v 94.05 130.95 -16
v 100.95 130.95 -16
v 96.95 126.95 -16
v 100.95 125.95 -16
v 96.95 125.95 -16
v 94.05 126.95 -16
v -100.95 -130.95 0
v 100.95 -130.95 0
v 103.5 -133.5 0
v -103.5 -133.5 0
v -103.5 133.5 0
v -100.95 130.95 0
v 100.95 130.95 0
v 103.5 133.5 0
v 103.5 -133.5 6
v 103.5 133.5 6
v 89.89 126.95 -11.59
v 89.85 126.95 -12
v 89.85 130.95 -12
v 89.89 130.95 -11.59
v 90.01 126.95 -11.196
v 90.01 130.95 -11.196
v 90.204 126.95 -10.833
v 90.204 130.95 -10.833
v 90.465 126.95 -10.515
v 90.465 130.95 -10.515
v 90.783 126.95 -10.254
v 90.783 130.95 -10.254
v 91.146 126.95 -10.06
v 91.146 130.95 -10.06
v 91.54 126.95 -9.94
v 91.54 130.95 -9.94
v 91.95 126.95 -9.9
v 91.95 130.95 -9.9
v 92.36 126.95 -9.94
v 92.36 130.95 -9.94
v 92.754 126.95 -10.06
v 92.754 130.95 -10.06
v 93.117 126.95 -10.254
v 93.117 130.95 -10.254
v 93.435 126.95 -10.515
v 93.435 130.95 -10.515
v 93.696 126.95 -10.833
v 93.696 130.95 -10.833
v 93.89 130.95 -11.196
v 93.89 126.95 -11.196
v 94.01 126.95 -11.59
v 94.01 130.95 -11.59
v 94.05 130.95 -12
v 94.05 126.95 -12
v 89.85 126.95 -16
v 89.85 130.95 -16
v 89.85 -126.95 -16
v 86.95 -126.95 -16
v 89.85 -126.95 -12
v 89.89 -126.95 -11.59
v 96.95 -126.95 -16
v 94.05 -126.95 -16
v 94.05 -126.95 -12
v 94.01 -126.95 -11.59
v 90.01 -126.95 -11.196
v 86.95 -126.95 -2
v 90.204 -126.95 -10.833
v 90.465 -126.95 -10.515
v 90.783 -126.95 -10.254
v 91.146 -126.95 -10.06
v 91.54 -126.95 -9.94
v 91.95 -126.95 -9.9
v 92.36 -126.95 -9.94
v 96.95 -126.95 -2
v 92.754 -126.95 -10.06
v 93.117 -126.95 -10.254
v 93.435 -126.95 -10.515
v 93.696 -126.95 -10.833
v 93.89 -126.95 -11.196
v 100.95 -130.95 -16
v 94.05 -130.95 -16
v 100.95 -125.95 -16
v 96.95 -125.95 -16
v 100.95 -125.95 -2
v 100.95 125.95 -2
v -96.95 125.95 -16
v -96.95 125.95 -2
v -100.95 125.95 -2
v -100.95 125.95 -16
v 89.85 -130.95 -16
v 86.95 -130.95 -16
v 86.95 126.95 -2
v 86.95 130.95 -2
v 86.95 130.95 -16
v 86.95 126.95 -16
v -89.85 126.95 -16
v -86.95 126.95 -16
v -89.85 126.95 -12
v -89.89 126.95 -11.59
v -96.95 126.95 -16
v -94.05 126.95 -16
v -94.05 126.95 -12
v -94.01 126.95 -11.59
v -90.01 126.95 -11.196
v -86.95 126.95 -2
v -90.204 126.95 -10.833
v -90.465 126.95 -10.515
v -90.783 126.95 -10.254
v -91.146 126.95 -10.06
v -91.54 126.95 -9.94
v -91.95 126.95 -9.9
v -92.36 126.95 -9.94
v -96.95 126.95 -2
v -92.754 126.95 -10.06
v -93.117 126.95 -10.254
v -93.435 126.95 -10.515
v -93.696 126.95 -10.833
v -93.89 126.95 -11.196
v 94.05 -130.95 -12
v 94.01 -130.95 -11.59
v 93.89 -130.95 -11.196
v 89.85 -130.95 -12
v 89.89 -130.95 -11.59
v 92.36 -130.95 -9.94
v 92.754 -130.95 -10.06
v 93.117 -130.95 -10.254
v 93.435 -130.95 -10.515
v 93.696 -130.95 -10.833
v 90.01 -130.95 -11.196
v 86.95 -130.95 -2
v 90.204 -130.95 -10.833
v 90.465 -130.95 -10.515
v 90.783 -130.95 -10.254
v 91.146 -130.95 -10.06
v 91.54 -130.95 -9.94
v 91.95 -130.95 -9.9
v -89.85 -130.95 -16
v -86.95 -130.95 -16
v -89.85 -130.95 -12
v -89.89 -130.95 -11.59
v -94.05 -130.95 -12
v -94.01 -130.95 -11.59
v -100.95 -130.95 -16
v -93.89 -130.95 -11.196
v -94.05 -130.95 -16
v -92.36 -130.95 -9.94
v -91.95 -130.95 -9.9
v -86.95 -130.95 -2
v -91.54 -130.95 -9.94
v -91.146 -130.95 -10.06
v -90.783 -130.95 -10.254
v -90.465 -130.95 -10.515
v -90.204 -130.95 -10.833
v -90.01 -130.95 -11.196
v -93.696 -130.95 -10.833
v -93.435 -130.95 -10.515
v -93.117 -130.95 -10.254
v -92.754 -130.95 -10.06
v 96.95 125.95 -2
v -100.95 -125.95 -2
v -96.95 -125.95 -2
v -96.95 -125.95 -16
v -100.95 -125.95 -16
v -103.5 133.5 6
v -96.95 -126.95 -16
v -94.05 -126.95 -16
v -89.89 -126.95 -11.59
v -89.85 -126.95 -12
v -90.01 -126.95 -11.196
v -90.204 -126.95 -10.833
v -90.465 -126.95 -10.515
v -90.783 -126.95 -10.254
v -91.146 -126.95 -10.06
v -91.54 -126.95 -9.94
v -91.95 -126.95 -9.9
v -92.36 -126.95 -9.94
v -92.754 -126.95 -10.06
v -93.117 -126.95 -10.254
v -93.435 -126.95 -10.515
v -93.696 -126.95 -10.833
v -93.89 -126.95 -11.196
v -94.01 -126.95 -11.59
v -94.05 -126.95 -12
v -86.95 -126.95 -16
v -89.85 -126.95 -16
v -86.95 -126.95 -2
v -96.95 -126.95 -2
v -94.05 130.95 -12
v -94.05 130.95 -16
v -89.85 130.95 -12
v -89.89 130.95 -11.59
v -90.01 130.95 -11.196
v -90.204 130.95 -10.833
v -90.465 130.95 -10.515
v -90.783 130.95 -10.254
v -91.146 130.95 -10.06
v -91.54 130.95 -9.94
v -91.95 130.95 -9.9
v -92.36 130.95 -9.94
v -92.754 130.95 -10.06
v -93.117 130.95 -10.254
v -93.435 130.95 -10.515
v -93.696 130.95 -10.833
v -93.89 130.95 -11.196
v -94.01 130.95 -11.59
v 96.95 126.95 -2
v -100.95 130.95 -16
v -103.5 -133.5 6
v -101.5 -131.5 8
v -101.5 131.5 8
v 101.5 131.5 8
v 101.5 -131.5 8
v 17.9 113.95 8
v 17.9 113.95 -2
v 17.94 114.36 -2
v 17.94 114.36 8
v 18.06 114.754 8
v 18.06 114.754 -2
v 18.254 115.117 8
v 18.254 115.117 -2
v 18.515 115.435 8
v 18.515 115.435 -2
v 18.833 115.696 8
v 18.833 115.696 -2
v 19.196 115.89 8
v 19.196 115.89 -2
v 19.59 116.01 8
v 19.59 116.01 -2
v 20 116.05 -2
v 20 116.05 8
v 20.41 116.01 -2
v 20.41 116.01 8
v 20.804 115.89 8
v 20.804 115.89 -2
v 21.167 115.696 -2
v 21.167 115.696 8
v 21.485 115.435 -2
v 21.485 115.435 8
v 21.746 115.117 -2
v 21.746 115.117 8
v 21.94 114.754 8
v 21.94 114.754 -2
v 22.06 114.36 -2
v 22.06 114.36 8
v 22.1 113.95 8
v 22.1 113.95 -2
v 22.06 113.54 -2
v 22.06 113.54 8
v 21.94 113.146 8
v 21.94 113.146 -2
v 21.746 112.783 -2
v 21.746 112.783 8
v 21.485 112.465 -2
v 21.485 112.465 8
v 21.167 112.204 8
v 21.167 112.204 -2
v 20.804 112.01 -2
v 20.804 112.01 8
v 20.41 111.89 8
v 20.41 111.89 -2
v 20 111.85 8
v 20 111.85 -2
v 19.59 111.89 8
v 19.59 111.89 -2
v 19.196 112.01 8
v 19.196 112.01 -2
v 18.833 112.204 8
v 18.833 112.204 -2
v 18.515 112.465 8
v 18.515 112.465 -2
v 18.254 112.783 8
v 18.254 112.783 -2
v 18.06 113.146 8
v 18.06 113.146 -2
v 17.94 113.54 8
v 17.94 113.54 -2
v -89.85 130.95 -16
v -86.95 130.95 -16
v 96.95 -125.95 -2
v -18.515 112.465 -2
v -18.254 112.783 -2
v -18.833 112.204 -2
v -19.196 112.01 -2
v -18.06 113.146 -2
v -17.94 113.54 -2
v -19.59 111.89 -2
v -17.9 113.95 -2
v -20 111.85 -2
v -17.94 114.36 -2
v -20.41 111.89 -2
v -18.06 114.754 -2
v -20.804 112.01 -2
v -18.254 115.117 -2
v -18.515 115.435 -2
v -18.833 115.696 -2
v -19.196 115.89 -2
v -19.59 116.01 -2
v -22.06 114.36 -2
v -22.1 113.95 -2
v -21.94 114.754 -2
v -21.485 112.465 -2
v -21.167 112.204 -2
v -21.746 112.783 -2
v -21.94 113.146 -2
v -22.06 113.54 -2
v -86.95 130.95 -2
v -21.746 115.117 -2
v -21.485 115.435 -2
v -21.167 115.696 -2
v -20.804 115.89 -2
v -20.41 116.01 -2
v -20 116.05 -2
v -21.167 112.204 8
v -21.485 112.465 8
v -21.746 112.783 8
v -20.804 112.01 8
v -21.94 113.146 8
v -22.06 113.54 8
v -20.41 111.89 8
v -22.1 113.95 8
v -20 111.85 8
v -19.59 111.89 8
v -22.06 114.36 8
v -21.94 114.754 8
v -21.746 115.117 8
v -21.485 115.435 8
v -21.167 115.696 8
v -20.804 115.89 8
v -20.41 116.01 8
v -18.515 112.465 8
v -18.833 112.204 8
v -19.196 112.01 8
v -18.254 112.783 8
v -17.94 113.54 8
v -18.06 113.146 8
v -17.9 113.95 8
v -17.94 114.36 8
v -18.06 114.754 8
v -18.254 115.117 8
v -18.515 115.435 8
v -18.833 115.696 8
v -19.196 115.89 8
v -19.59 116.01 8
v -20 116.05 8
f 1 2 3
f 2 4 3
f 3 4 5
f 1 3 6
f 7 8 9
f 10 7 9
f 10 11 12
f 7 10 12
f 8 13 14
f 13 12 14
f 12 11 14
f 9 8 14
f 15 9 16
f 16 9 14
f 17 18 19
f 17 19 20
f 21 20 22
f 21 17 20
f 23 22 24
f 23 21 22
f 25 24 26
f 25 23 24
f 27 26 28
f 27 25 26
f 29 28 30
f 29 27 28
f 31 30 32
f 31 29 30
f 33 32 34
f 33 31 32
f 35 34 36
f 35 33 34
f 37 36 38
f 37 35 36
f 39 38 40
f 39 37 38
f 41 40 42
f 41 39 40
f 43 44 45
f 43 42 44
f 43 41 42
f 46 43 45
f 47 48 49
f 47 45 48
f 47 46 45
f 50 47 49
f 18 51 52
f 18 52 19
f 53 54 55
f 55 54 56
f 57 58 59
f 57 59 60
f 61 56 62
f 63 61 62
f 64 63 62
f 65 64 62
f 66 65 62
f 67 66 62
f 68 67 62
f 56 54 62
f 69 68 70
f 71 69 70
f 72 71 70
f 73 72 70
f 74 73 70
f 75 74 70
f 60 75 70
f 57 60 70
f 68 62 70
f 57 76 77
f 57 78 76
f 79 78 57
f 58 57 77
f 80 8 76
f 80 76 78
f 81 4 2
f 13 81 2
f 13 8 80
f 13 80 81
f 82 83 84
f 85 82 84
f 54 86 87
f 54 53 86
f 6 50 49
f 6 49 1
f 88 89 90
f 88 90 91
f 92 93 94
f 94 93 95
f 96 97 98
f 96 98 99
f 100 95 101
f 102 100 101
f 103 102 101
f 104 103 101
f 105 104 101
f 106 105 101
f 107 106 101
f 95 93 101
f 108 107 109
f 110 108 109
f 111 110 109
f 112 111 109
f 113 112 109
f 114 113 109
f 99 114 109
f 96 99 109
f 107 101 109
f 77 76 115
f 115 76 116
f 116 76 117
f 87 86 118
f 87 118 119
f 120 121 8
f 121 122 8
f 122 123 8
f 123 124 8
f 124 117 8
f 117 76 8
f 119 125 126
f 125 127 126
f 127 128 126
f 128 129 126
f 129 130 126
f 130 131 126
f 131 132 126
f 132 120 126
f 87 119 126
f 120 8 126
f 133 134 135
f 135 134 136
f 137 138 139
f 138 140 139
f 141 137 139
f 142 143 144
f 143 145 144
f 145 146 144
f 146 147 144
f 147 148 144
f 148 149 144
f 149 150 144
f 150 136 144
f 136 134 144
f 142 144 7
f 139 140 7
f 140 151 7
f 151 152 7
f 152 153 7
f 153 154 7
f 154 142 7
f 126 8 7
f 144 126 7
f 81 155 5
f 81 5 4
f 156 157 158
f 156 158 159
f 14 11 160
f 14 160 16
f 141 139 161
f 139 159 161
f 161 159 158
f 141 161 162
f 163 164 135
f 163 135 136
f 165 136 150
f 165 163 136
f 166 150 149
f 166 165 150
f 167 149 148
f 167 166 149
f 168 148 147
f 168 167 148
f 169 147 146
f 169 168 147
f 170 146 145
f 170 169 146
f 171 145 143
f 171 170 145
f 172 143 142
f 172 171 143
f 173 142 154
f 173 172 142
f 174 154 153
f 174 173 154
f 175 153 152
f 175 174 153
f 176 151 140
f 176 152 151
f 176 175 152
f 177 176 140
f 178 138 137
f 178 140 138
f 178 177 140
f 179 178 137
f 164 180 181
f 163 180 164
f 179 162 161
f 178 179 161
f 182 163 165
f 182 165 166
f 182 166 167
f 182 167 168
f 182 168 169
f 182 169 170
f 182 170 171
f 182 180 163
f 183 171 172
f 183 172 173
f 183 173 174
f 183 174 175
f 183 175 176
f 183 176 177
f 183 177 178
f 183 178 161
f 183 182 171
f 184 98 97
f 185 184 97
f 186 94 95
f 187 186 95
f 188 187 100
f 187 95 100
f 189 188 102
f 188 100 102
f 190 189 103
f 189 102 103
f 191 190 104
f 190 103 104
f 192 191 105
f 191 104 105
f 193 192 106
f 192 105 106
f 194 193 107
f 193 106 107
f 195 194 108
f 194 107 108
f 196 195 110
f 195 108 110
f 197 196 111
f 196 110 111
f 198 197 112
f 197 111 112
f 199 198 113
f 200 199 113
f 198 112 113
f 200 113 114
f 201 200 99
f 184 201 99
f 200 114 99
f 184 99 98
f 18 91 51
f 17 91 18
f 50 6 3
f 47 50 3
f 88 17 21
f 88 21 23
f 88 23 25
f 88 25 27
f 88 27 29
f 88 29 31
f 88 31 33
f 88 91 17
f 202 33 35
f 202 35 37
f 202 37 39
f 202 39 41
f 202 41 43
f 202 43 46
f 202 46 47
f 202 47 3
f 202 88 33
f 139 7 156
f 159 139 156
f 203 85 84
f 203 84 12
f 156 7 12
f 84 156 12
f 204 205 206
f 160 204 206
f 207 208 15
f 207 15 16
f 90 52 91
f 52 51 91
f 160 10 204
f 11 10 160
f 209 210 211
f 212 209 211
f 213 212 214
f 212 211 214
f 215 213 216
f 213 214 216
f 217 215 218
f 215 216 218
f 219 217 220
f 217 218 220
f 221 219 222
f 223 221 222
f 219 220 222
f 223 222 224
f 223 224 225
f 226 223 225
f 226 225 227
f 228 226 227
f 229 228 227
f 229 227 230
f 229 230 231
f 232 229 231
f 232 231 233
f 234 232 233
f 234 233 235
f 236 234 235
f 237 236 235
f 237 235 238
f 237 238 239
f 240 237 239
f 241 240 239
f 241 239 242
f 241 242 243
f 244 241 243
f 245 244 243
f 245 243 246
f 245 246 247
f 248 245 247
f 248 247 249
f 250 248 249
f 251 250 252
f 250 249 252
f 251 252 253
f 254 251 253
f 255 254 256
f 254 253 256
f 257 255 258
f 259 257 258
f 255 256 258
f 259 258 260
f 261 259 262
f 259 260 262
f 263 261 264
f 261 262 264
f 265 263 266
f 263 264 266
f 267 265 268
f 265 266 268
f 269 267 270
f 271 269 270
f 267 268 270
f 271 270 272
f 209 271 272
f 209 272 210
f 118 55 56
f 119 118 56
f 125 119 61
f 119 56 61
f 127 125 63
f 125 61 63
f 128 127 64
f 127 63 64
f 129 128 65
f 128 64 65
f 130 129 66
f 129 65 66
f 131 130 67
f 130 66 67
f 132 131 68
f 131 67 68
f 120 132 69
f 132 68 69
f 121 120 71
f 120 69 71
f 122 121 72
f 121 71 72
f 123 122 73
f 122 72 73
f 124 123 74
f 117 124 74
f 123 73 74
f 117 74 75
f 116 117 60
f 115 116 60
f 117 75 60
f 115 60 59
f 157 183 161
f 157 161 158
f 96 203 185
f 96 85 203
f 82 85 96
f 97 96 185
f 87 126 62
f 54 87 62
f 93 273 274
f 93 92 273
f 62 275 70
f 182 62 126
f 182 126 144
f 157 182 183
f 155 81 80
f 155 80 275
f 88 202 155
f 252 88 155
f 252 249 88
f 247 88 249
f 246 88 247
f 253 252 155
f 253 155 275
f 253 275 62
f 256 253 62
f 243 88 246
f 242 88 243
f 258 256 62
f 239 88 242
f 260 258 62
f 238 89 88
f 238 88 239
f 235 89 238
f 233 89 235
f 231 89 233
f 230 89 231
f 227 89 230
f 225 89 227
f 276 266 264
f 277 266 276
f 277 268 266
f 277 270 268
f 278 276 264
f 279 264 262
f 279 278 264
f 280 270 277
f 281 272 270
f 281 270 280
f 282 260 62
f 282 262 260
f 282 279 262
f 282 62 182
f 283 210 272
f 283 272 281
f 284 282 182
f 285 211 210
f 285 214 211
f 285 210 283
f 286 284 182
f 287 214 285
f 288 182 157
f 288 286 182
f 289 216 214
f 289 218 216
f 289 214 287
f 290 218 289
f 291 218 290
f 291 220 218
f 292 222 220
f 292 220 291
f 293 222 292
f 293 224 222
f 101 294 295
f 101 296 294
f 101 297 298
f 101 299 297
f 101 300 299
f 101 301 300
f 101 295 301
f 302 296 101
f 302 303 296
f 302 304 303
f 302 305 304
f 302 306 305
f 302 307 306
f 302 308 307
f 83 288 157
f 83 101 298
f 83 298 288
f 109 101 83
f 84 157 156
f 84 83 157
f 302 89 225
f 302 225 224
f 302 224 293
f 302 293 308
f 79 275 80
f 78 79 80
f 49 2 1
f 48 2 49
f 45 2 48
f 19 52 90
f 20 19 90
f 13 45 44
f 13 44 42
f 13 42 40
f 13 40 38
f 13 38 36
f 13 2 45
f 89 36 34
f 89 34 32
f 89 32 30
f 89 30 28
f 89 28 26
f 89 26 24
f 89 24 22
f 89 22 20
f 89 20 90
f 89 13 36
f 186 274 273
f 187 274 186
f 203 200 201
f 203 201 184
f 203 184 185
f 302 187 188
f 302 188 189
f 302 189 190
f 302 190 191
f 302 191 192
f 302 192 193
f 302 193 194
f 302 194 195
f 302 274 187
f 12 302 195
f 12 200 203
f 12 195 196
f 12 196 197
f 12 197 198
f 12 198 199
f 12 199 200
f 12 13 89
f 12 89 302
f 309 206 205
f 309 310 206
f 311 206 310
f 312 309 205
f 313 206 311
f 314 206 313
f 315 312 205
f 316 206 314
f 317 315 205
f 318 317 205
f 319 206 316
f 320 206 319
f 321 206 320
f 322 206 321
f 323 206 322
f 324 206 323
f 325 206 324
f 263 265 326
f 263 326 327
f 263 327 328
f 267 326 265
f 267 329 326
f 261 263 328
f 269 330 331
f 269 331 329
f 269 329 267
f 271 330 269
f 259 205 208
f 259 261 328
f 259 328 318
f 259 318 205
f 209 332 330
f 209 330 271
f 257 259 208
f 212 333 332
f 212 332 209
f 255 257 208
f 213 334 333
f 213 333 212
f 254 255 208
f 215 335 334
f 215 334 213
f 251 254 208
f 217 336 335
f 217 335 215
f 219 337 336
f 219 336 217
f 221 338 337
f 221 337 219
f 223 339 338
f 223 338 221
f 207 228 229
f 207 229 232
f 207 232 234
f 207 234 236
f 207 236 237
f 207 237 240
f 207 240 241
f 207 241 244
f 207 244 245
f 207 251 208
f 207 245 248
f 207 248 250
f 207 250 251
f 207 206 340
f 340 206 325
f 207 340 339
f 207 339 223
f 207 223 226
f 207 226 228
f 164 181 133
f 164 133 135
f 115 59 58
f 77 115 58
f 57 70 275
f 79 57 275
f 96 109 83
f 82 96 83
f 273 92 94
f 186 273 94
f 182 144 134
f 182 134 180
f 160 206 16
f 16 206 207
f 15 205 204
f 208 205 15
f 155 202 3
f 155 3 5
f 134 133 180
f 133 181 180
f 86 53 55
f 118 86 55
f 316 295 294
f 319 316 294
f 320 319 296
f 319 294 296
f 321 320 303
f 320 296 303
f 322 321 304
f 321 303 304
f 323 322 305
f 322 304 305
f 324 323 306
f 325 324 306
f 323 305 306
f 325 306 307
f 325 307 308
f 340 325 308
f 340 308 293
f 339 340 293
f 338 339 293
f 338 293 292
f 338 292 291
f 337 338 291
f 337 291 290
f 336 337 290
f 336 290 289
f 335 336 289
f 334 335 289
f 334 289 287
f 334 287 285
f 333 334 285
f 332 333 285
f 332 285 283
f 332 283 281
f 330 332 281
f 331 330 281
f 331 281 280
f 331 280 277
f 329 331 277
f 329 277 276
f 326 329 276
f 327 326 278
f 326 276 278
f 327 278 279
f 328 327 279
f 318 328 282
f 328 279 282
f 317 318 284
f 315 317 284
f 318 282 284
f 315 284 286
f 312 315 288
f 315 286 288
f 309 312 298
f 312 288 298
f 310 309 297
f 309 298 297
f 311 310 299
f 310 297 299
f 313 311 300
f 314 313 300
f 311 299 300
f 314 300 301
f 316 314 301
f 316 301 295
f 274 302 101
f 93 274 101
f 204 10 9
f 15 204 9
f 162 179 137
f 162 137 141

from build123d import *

# Parameters (mm, degrees)
SKETCH1_W                                = 207
SKETCH1_H                                = 267
BOSS_EXTRUDE1_DEPTH                      = 8
SKETCH2_W                                = 201.9
SKETCH2_H                                = 261.9
BOSS_EXTRUDE2_DEPTH                      = 2
BOSS_EXTRUDE3_DEPTH                      = 14
CUT_EXTRUDE1_DEPTH                       = 281.717745253
MIRROR1_AT_THE_SECOND_PLANE_COPY_1_DEPTH = 14
MIRROR1_AT_THE_SECOND_PLANE_COPY_2_DEPTH = 281.717745253
SKETCH5_R                                = 2.1
CUT_EXTRUDE2_DEPTH                       = 170.500737462
CHAMFER1_SIZE                            = 2


with BuildPart() as part:
    # Sketch1 → Boss-Extrude1 (new body)
    with BuildSketch(Plane.XY):
        Rectangle(SKETCH1_W, SKETCH1_H)
    extrude(amount=BOSS_EXTRUDE1_DEPTH)

    # Sketch2 → Boss-Extrude2 (add)
    with BuildSketch(Plane(origin=(0, 0, 0), x_dir=(-1, 0, 0), z_dir=(0, 0, -1))):
        Rectangle(SKETCH2_W, SKETCH2_H)
    extrude(amount=BOSS_EXTRUDE2_DEPTH)

    # Sketch3 → Boss-Extrude3 (add)
    with BuildSketch(Plane(origin=(0, 0, -2), x_dir=(-1, 0, 0), z_dir=(0, 0, -1))):
        Polygon((86.95, -130.95), (86.95, -126.95), (96.95, -126.95), (96.95, -125.95), (100.95, -125.95), (100.95, -130.95), align=None)
    boss_extrude3 = extrude(amount=BOSS_EXTRUDE3_DEPTH)

    # Sketch4 → Cut-Extrude1 (cut, through all)
    with BuildSketch(Plane(origin=(0, -126.95, 0), x_dir=(1, 0, 0), z_dir=(0, 1, 0))):
        with BuildLine():
            Line((-89.85, 16), (-89.85, 12))
            ThreePointArc((-89.85, 12), (-91.95, 9.9), (-94.05, 12))
            Line((-94.05, 12), (-94.05, 16))
            ThreePointArc((-94.05, 16), (-91.95, 18.1), (-89.85, 16))
        make_face()
    cut_extrude1 = extrude(amount=-CUT_EXTRUDE1_DEPTH, mode=Mode.SUBTRACT)

    # Mirror1: Boss-Extrude3, Cut-Extrude1 across plane
    add(boss_extrude3.mirror(Plane.ZX))
    add(cut_extrude1.mirror(Plane.ZX), mode=Mode.SUBTRACT)

    # Mirror1 at the second plane: Boss-Extrude3, Cut-Extrude1 across plane
    add(boss_extrude3.mirror(Plane(origin=(0, 0, 0), x_dir=(0, 0, 1), z_dir=(1, 0, 0))))
    add(cut_extrude1.mirror(Plane(origin=(0, 0, 0), x_dir=(0, 0, 1), z_dir=(1, 0, 0))), mode=Mode.SUBTRACT)

    # Mirror1 at the second plane copy 1 sketc → Mirror1 at the second plane copy 1 (add)
    with BuildSketch(Plane(origin=(0, 0, -2), x_dir=(1, 0, 0), z_dir=(0, 0, -1))):
        Polygon((86.95, -130.95), (86.95, -126.95), (96.95, -126.95), (96.95, -125.95), (100.95, -125.95), (100.95, -130.95), align=None)
    extrude(amount=MIRROR1_AT_THE_SECOND_PLANE_COPY_1_DEPTH)

    # Mirror1 at the second plane copy 2 sketc → Mirror1 at the second plane copy 2 (cut, through all)
    with BuildSketch(Plane(origin=(0, 126.95, 0), x_dir=(-1, 0, 0), z_dir=(0, -1, 0))):
        with BuildLine():
            Line((-89.85, 16), (-89.85, 12))
            ThreePointArc((-89.85, 12), (-91.95, 9.9), (-94.05, 12))
            Line((-94.05, 12), (-94.05, 16))
            ThreePointArc((-94.05, 16), (-91.95, 18.1), (-89.85, 16))
        make_face()
    extrude(amount=-MIRROR1_AT_THE_SECOND_PLANE_COPY_2_DEPTH, mode=Mode.SUBTRACT)

    # Sketch5 → Cut-Extrude2 (cut, through all)
    with BuildSketch(Plane(origin=(0, 0, -2), x_dir=(-1, 0, 0), z_dir=(0, 0, -1))):
        with Locations((-20, 113.95)):
            Circle(SKETCH5_R)
        with Locations((20, 113.95)):
            Circle(SKETCH5_R)
    extrude(amount=-CUT_EXTRUDE2_DEPTH, mode=Mode.SUBTRACT)

    # Chamfer1
    chamfer1_edges = [part.edges().sort_by_distance(p)[0] for p in [
        (-103.5, 0, 8),
        (0, -133.5, 8),
        (103.5, 0, 8),
        (0, 133.5, 8),
    ]]
    chamfer(chamfer1_edges, length=CHAMFER1_SIZE)


solid = part.part
